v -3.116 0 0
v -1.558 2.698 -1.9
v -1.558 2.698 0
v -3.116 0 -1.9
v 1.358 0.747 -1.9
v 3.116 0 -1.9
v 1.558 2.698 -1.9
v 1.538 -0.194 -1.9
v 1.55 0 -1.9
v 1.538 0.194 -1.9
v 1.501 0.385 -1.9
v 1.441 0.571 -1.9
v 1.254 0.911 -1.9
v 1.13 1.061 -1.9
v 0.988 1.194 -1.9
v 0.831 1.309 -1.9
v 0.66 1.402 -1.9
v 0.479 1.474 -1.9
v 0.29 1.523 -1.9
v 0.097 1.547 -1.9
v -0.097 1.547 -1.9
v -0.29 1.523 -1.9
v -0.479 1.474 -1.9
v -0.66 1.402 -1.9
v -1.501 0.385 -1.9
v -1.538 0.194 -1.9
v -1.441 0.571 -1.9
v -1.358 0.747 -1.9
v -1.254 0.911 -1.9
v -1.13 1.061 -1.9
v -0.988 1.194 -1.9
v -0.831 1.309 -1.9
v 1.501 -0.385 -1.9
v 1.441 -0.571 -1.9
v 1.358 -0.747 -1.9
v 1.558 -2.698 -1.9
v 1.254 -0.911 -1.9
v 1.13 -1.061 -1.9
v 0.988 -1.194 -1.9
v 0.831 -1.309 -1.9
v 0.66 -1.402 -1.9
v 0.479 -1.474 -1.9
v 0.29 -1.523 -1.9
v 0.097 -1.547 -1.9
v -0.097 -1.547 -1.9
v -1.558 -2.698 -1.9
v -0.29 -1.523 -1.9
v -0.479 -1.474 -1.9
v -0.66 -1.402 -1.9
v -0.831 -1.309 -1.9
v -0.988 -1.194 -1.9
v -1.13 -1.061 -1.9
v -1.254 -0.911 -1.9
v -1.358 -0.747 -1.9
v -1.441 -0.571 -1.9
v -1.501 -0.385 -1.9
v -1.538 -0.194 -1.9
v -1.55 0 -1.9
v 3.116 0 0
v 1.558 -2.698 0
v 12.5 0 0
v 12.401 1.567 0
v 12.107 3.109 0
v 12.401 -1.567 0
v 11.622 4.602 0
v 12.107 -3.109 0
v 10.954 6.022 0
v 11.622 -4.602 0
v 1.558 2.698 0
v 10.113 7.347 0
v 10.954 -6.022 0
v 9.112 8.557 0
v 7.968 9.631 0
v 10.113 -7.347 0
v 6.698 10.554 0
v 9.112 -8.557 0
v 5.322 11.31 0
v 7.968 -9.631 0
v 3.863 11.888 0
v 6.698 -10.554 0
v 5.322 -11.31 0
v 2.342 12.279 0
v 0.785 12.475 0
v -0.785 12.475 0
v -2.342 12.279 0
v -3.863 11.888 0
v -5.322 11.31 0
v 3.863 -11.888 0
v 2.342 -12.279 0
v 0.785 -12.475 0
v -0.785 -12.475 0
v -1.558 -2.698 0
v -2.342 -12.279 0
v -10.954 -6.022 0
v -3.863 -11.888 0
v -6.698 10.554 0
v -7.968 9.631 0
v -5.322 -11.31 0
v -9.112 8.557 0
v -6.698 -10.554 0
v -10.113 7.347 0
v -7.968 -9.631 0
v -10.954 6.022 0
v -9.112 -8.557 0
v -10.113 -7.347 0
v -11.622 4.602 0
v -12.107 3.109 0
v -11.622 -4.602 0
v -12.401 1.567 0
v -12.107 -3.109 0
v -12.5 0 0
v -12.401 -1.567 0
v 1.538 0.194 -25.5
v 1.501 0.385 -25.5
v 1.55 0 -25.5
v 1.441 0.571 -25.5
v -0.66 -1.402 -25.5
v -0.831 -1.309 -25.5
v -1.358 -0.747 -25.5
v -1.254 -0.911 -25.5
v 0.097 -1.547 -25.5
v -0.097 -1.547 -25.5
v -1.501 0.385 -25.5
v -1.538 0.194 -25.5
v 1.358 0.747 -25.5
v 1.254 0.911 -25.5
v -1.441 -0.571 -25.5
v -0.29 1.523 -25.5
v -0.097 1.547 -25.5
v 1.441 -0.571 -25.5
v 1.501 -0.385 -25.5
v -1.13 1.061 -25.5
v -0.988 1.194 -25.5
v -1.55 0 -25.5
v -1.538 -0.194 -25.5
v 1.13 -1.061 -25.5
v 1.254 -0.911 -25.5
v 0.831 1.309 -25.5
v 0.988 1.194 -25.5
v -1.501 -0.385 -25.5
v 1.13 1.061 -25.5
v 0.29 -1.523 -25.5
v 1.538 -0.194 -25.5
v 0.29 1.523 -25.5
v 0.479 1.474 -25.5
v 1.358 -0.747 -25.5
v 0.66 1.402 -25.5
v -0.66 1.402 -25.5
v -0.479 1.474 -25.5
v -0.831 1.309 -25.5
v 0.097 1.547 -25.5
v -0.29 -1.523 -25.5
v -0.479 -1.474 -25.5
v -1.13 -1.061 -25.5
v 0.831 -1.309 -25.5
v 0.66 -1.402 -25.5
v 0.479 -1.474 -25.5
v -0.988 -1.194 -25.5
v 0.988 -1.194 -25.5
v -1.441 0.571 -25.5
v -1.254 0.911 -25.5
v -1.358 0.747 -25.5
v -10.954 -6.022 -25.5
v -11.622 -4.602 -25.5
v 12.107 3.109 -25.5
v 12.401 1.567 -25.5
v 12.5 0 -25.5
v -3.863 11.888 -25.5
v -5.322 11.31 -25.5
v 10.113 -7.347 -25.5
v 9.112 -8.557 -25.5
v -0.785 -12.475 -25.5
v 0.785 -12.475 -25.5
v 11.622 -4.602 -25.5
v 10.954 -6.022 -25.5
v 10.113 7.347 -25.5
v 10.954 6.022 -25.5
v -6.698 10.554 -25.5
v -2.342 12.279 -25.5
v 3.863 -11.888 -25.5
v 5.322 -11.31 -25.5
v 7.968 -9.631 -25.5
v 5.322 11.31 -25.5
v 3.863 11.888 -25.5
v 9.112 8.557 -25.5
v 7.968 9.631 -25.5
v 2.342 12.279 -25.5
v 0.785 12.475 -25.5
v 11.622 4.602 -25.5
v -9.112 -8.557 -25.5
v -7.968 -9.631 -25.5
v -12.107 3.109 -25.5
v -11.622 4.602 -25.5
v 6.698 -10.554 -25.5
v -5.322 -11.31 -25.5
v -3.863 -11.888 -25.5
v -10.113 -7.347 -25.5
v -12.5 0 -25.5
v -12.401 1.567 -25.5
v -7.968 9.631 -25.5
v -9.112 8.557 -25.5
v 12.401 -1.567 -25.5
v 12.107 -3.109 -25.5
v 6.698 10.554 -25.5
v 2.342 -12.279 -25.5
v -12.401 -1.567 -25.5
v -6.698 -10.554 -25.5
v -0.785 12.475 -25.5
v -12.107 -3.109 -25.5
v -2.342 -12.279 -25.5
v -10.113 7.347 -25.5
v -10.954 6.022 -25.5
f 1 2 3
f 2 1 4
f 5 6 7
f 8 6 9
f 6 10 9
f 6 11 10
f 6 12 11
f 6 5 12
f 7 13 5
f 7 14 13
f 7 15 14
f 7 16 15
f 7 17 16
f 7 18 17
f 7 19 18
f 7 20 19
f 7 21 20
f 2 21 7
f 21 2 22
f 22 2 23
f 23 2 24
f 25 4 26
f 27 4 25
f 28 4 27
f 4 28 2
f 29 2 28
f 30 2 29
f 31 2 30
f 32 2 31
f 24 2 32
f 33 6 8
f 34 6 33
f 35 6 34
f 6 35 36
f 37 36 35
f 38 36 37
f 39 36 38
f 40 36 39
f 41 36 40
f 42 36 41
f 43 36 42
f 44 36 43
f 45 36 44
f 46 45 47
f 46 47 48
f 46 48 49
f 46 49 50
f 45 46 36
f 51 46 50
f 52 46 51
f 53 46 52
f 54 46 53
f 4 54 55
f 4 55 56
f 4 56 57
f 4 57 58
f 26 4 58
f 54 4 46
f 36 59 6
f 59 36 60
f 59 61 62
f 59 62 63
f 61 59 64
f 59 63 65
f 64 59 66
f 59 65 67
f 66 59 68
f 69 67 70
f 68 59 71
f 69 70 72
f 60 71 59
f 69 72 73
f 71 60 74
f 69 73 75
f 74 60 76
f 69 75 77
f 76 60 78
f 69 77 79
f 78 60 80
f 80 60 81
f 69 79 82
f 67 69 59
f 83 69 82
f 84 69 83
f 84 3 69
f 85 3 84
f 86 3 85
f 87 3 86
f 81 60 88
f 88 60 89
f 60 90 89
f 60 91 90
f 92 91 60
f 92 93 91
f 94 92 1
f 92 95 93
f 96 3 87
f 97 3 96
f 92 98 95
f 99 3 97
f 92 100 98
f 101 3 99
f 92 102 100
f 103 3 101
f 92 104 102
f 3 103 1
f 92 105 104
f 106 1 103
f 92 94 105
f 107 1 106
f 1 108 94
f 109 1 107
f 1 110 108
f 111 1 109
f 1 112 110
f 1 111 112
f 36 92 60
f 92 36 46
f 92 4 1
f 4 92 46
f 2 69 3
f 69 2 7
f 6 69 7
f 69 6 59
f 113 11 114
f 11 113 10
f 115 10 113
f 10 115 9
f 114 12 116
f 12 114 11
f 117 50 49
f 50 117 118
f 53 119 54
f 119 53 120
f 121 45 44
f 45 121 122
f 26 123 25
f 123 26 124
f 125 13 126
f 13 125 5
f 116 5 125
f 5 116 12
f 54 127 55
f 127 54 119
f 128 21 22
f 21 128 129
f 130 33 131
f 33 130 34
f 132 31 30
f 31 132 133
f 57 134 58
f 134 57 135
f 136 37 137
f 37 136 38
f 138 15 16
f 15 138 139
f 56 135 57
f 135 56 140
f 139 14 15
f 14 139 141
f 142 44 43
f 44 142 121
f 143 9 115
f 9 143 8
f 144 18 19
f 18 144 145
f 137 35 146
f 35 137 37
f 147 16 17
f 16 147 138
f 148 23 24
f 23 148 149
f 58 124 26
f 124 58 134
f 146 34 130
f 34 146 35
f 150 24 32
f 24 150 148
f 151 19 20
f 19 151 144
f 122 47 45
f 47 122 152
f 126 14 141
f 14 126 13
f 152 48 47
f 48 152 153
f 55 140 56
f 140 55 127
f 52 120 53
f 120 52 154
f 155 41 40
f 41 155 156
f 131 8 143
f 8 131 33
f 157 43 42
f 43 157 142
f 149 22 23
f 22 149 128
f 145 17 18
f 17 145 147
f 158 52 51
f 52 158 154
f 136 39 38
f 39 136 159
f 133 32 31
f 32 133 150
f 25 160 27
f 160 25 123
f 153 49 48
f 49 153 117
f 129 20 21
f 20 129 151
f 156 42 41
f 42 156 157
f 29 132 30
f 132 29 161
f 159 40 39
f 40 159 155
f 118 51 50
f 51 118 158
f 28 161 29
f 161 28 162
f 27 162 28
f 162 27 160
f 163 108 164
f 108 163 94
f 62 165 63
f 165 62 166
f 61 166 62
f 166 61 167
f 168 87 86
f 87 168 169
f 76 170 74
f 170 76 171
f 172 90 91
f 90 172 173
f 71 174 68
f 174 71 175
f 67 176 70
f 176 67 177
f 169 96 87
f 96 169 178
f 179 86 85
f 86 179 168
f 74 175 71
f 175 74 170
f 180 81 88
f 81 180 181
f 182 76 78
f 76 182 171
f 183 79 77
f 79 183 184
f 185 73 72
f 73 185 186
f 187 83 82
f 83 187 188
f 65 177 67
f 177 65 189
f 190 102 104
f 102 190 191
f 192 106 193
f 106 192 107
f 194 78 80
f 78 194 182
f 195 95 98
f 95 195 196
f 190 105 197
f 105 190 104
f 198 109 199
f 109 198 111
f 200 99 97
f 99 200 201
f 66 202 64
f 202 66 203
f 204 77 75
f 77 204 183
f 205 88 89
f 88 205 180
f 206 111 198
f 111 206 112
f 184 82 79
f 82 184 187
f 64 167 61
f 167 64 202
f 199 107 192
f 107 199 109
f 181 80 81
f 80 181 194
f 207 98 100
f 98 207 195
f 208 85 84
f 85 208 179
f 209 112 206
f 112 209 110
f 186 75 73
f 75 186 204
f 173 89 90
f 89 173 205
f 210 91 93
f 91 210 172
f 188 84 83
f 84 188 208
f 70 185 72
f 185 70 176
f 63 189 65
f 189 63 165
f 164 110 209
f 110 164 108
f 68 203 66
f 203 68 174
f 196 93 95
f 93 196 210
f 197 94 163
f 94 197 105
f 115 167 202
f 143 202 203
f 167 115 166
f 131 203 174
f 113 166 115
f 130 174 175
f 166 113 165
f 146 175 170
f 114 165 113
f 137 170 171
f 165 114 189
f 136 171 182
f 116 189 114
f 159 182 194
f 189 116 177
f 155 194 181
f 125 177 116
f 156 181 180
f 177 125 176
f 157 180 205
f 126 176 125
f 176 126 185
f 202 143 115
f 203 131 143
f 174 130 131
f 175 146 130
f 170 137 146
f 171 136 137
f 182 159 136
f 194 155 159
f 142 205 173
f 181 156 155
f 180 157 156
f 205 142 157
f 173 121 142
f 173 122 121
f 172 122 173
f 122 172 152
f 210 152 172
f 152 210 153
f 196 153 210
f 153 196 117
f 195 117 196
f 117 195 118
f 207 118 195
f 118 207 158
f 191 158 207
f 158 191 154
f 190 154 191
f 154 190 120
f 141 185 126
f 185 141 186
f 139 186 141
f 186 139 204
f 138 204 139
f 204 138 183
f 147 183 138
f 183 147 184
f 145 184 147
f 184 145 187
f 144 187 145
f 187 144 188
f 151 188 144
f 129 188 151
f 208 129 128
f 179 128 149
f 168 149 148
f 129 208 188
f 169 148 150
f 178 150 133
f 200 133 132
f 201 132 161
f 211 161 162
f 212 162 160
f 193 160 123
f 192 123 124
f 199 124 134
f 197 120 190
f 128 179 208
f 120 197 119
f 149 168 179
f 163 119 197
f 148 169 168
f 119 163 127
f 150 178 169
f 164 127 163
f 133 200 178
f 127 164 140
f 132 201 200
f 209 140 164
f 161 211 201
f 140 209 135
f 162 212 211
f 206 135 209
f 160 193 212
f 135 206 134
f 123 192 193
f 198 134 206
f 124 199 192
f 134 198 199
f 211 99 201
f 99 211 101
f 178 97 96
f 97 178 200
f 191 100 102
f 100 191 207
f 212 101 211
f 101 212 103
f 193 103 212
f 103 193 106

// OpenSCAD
$fn = 50;

difference() {
	union() {
		translate(v = [0, 0, -25.5]) {
			cylinder(h = 25.5, r = 12.5);
		}
	}
	union() {
		translate(v = [0, 0, 0]) {
			rotate(a = [0, 0, 0]) {
				difference() {
					union() {
						translate(v = [0, 0, -1.9]) {
							linear_extrude(height = 1.9) {
								polygon(points = [[3.1158, 0.0], [1.5579000000000005, 2.698361953111554], [-1.5578999999999994, 2.6983619531115544], [-3.1158, 3.815754496783323e-16], [-1.5579000000000014, -2.6983619531115535], [1.557899999999998, -2.6983619531115552]]);
							}
						}
					}
					union();
				}
			}
		}
		#translate(v = [0, 0, -100.0]) {
			cylinder(h = 200, r = 1.55);
		}
	}
}
